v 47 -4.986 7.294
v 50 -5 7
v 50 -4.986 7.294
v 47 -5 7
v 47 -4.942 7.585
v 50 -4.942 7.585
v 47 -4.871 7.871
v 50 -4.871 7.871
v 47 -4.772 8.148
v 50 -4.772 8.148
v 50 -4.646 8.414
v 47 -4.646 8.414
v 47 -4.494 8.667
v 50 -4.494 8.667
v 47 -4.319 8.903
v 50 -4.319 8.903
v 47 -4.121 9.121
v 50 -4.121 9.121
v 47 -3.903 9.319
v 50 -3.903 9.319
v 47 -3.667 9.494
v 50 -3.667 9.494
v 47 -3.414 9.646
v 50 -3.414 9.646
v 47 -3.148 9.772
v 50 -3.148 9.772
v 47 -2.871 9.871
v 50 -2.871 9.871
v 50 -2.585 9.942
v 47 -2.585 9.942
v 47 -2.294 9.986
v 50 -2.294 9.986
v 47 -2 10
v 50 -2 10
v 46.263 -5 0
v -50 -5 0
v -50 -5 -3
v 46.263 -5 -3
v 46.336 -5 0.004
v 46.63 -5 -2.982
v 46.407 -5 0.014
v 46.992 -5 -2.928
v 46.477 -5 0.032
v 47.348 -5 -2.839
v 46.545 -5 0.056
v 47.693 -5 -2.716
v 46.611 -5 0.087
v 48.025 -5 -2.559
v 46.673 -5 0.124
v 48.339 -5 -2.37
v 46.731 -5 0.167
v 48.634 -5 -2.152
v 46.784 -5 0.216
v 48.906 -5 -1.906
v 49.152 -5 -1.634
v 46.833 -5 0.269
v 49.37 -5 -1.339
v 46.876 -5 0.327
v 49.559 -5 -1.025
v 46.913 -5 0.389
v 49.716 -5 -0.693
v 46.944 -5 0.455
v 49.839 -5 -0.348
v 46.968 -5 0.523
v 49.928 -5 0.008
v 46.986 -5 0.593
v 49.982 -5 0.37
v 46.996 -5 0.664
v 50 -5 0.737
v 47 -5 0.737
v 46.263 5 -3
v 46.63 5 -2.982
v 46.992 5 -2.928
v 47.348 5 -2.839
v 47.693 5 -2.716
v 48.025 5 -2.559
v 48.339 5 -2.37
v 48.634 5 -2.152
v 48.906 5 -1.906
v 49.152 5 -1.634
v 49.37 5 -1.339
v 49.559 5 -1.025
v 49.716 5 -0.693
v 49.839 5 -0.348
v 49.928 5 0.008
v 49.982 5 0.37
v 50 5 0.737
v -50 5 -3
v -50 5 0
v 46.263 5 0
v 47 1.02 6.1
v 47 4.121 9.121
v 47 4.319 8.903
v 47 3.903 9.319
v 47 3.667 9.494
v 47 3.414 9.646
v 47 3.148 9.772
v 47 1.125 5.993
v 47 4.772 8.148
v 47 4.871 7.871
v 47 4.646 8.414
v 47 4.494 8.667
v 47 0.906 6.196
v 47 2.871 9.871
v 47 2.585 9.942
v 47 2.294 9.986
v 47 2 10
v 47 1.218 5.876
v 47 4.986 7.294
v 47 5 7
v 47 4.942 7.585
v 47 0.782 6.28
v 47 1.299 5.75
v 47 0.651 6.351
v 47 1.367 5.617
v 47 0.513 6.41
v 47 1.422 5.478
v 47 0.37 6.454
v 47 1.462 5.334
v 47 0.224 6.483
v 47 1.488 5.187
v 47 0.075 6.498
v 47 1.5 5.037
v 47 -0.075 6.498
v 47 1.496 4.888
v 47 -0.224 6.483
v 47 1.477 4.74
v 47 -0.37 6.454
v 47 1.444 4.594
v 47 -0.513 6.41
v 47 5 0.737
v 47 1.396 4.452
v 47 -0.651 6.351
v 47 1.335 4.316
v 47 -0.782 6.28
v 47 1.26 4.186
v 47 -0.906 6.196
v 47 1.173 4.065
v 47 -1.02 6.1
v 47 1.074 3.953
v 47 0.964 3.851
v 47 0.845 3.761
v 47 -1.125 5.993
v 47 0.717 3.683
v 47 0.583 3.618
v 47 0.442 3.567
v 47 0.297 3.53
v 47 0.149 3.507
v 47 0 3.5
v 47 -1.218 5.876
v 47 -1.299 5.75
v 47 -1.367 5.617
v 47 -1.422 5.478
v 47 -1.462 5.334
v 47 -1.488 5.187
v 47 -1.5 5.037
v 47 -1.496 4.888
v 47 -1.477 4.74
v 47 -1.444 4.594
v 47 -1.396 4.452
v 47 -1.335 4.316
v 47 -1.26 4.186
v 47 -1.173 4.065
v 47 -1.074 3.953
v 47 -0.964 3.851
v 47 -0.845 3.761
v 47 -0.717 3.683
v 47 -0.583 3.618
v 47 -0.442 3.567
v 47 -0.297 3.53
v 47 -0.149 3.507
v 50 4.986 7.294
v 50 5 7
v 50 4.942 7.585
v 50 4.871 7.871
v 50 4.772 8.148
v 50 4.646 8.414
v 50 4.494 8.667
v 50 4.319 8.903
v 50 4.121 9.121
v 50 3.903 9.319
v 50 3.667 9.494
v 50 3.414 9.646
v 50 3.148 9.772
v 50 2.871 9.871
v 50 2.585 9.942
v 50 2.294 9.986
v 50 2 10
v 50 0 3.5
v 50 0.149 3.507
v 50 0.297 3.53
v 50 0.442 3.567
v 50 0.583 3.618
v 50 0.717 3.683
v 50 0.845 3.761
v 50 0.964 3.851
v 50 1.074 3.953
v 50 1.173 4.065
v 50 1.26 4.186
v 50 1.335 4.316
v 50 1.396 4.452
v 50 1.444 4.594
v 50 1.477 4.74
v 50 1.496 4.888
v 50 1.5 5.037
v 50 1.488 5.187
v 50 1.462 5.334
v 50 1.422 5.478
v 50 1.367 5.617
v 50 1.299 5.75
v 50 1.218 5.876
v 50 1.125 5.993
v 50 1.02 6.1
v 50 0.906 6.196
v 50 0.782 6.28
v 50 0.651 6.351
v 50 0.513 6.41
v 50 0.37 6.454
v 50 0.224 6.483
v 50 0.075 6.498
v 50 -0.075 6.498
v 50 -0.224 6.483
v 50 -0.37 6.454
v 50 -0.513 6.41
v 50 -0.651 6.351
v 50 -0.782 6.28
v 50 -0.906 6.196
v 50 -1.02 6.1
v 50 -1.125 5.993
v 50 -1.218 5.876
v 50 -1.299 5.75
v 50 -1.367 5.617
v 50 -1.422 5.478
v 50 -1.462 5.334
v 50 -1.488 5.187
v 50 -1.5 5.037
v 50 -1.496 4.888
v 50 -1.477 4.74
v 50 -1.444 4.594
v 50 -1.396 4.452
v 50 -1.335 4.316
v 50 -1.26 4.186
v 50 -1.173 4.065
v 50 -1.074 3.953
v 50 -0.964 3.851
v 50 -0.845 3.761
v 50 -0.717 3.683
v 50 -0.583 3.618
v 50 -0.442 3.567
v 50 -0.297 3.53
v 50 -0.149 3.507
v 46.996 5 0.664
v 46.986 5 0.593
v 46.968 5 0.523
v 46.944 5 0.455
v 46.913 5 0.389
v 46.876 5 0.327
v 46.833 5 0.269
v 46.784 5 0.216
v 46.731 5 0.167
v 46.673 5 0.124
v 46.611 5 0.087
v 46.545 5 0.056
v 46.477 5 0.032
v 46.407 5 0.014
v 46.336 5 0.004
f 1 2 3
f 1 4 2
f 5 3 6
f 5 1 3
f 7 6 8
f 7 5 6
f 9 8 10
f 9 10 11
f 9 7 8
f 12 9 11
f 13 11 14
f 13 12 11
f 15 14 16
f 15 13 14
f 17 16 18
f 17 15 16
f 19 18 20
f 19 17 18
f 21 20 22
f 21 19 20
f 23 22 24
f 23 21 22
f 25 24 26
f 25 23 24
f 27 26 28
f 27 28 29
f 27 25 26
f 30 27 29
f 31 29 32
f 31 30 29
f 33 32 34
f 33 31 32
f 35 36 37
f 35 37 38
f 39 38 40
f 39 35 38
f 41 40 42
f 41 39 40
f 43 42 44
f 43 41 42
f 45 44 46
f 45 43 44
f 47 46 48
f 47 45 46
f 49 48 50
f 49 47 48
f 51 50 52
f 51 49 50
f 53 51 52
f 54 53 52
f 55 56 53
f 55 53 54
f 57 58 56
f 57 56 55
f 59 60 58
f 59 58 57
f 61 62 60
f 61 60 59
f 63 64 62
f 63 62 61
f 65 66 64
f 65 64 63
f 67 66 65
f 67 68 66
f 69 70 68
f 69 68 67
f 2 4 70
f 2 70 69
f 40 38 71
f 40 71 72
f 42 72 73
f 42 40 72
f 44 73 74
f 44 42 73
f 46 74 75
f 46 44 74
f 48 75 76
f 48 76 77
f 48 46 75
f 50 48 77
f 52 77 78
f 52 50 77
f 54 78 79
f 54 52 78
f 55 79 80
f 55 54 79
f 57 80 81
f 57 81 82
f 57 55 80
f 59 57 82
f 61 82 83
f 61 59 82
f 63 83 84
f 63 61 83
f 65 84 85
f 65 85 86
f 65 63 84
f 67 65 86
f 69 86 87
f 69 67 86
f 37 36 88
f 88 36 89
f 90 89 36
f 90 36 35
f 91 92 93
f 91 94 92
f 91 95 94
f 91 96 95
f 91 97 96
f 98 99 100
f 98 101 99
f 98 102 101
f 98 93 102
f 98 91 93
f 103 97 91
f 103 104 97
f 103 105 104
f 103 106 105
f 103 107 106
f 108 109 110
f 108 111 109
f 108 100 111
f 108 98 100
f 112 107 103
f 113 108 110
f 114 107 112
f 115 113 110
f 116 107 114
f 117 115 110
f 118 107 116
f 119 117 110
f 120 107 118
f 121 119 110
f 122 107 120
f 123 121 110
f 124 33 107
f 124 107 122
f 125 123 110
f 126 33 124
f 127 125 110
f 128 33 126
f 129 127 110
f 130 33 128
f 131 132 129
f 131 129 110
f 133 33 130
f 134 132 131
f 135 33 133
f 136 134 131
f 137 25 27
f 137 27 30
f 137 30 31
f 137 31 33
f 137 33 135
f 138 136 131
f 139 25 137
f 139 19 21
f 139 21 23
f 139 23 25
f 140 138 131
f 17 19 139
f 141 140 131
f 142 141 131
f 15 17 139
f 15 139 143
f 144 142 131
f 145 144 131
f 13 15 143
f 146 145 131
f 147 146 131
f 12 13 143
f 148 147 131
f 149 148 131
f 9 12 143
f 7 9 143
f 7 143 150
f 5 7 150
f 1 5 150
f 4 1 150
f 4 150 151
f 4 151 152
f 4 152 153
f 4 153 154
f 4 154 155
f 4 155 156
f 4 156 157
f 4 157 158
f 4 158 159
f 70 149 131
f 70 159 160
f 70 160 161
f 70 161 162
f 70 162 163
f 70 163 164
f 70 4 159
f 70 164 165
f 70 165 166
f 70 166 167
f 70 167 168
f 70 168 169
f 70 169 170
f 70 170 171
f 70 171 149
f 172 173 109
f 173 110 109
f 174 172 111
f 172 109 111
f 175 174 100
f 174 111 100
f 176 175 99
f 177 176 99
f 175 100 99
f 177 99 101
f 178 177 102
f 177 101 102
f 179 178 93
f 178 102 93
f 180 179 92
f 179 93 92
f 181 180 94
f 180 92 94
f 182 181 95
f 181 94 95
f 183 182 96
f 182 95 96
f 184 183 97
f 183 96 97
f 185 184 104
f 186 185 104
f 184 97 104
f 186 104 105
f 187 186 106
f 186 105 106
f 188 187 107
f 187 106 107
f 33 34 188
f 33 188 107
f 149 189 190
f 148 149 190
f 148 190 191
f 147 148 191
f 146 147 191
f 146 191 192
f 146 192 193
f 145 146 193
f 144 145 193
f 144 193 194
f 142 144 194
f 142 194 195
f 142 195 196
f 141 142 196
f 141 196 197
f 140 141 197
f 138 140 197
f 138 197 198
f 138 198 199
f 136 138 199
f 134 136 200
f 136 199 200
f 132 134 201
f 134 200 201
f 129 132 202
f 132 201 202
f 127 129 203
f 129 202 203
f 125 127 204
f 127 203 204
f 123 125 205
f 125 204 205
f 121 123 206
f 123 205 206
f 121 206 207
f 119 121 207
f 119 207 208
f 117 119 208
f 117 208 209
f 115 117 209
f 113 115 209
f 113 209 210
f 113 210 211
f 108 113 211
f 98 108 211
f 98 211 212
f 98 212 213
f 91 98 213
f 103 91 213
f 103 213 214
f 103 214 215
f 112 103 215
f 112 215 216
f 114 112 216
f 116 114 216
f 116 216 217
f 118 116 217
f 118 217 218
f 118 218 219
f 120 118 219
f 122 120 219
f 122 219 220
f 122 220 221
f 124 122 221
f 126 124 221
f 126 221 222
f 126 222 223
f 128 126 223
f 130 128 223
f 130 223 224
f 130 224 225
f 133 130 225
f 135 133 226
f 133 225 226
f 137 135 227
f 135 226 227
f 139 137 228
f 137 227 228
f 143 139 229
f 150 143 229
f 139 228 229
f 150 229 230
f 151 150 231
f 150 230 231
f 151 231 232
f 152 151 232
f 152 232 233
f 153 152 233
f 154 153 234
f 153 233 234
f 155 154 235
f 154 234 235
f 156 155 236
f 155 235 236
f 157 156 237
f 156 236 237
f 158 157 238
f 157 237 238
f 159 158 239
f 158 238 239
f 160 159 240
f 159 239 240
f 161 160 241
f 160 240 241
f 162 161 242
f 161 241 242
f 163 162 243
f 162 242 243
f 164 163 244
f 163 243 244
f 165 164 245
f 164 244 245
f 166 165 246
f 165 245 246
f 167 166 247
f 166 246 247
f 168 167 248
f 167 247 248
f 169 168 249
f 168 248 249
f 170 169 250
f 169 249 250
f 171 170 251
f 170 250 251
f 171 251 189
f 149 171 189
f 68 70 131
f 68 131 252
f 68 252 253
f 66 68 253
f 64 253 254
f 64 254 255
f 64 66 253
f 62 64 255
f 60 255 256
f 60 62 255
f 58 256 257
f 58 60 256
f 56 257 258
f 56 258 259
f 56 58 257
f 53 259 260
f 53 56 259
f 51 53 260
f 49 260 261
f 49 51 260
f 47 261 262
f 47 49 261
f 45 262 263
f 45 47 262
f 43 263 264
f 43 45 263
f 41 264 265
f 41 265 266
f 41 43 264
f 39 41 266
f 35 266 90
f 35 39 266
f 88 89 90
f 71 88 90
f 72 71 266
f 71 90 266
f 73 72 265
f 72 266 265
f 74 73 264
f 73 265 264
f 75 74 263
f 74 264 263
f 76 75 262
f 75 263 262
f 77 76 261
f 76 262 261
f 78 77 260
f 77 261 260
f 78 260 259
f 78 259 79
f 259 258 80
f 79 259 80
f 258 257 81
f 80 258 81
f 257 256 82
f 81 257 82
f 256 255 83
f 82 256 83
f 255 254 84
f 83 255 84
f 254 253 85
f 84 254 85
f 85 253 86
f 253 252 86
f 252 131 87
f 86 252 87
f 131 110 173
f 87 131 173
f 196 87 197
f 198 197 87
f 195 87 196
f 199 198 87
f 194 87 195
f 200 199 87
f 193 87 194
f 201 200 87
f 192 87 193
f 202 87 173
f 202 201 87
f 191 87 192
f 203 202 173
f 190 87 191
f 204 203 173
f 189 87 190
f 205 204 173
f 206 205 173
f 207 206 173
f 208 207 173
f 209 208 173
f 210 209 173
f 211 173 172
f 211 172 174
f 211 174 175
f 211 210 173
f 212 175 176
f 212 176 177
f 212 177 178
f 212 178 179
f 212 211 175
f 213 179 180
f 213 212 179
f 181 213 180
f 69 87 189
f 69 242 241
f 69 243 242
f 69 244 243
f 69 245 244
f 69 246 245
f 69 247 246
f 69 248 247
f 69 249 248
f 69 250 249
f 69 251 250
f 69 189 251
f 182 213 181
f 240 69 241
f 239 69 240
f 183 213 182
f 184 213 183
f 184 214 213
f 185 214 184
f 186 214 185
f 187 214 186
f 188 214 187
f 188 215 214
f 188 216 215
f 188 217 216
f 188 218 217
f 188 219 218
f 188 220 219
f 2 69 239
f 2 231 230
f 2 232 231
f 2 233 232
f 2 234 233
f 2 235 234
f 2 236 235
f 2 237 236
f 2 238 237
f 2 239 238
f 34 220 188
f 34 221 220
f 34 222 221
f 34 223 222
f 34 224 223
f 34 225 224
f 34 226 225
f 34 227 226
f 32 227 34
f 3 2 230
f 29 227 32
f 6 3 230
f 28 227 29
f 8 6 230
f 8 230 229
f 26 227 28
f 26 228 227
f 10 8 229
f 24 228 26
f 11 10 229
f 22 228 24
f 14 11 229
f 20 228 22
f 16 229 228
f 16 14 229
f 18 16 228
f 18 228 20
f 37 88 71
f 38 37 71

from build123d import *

# Parameters (mm, degrees)
SKETCH_1_W                       = 100
SKETCH_1_H                       = 10
SM_BASE_FLANGE_1_DEPTH           = 3
SM_EDGE_FLANGE_1_STRIP_W         = 13.4732
SM_EDGE_FLANGE_1_STRIP_H         = 3
SM_EDGE_FLANGE_1_STRIP_CUT_DEPTH = 10
SM_EDGE_FLANGE_1_DEPTH           = 10
SKETCH_9_R                       = 1.5
CUT_EXTRUDE_1_DEPTH              = 10
FILLET_1_R                       = 3


# Sheet-metal steps are written as plain solids
with BuildPart() as part:
    # Sketch 1 → 基体-法兰1 (new body)
    with BuildSketch(Plane.XY):
        Rectangle(SKETCH_1_W, SKETCH_1_H)
    extrude(amount=-SM_BASE_FLANGE_1_DEPTH)

    # 边线-法兰1 strip (across the edge) → 边线-法兰1 strip cut (cut)
    with BuildSketch(Plane(origin=(50, -5, 0), x_dir=(-1, 0, 0), z_dir=(0, 1, 0))):
        with Locations((-3, -1.5)):
            Rectangle(SM_EDGE_FLANGE_1_STRIP_W, SM_EDGE_FLANGE_1_STRIP_H)
    extrude(amount=SM_EDGE_FLANGE_1_STRIP_CUT_DEPTH, mode=Mode.SUBTRACT)

    # 边线-法兰1 section (across the edge) → 边线-法兰1 (add)
    with BuildSketch(Plane(origin=(50, -5, 0), x_dir=(-1, 0, 0), z_dir=(0, 1, 0))):
        with BuildLine():
            Line((0, 0.7366), (0, 10))
            Line((0, 10), (3, 10))
            Line((3, 10), (3, 0.7366))
            ThreePointArc((3, 0.7366), (3.215745145, 0.215745145), (3.7366, 0))
            Line((3.7366, 0), (3.7366, -3))
            ThreePointArc((3.7366, -3), (1.094424801, -1.905575199), (0, 0.7366))
        make_face()
    extrude(amount=SM_EDGE_FLANGE_1_DEPTH)

    # 草图9 → 切除-拉伸1 (cut)
    with BuildSketch(Plane(origin=(50, 0, 0), x_dir=(0, 0, -1), z_dir=(1, 0, 0))):
        with Locations((-5, 0)):
            Circle(SKETCH_9_R)
    extrude(amount=-CUT_EXTRUDE_1_DEPTH, mode=Mode.SUBTRACT)

    # 圆角1
    fillet_1_edges = [part.edges().sort_by_distance(p)[0] for p in [
        (48.5, -5, 10),
        (48.5, 5, 10),
    ]]
    fillet(fillet_1_edges, radius=FILLET_1_R)


solid = part.part
